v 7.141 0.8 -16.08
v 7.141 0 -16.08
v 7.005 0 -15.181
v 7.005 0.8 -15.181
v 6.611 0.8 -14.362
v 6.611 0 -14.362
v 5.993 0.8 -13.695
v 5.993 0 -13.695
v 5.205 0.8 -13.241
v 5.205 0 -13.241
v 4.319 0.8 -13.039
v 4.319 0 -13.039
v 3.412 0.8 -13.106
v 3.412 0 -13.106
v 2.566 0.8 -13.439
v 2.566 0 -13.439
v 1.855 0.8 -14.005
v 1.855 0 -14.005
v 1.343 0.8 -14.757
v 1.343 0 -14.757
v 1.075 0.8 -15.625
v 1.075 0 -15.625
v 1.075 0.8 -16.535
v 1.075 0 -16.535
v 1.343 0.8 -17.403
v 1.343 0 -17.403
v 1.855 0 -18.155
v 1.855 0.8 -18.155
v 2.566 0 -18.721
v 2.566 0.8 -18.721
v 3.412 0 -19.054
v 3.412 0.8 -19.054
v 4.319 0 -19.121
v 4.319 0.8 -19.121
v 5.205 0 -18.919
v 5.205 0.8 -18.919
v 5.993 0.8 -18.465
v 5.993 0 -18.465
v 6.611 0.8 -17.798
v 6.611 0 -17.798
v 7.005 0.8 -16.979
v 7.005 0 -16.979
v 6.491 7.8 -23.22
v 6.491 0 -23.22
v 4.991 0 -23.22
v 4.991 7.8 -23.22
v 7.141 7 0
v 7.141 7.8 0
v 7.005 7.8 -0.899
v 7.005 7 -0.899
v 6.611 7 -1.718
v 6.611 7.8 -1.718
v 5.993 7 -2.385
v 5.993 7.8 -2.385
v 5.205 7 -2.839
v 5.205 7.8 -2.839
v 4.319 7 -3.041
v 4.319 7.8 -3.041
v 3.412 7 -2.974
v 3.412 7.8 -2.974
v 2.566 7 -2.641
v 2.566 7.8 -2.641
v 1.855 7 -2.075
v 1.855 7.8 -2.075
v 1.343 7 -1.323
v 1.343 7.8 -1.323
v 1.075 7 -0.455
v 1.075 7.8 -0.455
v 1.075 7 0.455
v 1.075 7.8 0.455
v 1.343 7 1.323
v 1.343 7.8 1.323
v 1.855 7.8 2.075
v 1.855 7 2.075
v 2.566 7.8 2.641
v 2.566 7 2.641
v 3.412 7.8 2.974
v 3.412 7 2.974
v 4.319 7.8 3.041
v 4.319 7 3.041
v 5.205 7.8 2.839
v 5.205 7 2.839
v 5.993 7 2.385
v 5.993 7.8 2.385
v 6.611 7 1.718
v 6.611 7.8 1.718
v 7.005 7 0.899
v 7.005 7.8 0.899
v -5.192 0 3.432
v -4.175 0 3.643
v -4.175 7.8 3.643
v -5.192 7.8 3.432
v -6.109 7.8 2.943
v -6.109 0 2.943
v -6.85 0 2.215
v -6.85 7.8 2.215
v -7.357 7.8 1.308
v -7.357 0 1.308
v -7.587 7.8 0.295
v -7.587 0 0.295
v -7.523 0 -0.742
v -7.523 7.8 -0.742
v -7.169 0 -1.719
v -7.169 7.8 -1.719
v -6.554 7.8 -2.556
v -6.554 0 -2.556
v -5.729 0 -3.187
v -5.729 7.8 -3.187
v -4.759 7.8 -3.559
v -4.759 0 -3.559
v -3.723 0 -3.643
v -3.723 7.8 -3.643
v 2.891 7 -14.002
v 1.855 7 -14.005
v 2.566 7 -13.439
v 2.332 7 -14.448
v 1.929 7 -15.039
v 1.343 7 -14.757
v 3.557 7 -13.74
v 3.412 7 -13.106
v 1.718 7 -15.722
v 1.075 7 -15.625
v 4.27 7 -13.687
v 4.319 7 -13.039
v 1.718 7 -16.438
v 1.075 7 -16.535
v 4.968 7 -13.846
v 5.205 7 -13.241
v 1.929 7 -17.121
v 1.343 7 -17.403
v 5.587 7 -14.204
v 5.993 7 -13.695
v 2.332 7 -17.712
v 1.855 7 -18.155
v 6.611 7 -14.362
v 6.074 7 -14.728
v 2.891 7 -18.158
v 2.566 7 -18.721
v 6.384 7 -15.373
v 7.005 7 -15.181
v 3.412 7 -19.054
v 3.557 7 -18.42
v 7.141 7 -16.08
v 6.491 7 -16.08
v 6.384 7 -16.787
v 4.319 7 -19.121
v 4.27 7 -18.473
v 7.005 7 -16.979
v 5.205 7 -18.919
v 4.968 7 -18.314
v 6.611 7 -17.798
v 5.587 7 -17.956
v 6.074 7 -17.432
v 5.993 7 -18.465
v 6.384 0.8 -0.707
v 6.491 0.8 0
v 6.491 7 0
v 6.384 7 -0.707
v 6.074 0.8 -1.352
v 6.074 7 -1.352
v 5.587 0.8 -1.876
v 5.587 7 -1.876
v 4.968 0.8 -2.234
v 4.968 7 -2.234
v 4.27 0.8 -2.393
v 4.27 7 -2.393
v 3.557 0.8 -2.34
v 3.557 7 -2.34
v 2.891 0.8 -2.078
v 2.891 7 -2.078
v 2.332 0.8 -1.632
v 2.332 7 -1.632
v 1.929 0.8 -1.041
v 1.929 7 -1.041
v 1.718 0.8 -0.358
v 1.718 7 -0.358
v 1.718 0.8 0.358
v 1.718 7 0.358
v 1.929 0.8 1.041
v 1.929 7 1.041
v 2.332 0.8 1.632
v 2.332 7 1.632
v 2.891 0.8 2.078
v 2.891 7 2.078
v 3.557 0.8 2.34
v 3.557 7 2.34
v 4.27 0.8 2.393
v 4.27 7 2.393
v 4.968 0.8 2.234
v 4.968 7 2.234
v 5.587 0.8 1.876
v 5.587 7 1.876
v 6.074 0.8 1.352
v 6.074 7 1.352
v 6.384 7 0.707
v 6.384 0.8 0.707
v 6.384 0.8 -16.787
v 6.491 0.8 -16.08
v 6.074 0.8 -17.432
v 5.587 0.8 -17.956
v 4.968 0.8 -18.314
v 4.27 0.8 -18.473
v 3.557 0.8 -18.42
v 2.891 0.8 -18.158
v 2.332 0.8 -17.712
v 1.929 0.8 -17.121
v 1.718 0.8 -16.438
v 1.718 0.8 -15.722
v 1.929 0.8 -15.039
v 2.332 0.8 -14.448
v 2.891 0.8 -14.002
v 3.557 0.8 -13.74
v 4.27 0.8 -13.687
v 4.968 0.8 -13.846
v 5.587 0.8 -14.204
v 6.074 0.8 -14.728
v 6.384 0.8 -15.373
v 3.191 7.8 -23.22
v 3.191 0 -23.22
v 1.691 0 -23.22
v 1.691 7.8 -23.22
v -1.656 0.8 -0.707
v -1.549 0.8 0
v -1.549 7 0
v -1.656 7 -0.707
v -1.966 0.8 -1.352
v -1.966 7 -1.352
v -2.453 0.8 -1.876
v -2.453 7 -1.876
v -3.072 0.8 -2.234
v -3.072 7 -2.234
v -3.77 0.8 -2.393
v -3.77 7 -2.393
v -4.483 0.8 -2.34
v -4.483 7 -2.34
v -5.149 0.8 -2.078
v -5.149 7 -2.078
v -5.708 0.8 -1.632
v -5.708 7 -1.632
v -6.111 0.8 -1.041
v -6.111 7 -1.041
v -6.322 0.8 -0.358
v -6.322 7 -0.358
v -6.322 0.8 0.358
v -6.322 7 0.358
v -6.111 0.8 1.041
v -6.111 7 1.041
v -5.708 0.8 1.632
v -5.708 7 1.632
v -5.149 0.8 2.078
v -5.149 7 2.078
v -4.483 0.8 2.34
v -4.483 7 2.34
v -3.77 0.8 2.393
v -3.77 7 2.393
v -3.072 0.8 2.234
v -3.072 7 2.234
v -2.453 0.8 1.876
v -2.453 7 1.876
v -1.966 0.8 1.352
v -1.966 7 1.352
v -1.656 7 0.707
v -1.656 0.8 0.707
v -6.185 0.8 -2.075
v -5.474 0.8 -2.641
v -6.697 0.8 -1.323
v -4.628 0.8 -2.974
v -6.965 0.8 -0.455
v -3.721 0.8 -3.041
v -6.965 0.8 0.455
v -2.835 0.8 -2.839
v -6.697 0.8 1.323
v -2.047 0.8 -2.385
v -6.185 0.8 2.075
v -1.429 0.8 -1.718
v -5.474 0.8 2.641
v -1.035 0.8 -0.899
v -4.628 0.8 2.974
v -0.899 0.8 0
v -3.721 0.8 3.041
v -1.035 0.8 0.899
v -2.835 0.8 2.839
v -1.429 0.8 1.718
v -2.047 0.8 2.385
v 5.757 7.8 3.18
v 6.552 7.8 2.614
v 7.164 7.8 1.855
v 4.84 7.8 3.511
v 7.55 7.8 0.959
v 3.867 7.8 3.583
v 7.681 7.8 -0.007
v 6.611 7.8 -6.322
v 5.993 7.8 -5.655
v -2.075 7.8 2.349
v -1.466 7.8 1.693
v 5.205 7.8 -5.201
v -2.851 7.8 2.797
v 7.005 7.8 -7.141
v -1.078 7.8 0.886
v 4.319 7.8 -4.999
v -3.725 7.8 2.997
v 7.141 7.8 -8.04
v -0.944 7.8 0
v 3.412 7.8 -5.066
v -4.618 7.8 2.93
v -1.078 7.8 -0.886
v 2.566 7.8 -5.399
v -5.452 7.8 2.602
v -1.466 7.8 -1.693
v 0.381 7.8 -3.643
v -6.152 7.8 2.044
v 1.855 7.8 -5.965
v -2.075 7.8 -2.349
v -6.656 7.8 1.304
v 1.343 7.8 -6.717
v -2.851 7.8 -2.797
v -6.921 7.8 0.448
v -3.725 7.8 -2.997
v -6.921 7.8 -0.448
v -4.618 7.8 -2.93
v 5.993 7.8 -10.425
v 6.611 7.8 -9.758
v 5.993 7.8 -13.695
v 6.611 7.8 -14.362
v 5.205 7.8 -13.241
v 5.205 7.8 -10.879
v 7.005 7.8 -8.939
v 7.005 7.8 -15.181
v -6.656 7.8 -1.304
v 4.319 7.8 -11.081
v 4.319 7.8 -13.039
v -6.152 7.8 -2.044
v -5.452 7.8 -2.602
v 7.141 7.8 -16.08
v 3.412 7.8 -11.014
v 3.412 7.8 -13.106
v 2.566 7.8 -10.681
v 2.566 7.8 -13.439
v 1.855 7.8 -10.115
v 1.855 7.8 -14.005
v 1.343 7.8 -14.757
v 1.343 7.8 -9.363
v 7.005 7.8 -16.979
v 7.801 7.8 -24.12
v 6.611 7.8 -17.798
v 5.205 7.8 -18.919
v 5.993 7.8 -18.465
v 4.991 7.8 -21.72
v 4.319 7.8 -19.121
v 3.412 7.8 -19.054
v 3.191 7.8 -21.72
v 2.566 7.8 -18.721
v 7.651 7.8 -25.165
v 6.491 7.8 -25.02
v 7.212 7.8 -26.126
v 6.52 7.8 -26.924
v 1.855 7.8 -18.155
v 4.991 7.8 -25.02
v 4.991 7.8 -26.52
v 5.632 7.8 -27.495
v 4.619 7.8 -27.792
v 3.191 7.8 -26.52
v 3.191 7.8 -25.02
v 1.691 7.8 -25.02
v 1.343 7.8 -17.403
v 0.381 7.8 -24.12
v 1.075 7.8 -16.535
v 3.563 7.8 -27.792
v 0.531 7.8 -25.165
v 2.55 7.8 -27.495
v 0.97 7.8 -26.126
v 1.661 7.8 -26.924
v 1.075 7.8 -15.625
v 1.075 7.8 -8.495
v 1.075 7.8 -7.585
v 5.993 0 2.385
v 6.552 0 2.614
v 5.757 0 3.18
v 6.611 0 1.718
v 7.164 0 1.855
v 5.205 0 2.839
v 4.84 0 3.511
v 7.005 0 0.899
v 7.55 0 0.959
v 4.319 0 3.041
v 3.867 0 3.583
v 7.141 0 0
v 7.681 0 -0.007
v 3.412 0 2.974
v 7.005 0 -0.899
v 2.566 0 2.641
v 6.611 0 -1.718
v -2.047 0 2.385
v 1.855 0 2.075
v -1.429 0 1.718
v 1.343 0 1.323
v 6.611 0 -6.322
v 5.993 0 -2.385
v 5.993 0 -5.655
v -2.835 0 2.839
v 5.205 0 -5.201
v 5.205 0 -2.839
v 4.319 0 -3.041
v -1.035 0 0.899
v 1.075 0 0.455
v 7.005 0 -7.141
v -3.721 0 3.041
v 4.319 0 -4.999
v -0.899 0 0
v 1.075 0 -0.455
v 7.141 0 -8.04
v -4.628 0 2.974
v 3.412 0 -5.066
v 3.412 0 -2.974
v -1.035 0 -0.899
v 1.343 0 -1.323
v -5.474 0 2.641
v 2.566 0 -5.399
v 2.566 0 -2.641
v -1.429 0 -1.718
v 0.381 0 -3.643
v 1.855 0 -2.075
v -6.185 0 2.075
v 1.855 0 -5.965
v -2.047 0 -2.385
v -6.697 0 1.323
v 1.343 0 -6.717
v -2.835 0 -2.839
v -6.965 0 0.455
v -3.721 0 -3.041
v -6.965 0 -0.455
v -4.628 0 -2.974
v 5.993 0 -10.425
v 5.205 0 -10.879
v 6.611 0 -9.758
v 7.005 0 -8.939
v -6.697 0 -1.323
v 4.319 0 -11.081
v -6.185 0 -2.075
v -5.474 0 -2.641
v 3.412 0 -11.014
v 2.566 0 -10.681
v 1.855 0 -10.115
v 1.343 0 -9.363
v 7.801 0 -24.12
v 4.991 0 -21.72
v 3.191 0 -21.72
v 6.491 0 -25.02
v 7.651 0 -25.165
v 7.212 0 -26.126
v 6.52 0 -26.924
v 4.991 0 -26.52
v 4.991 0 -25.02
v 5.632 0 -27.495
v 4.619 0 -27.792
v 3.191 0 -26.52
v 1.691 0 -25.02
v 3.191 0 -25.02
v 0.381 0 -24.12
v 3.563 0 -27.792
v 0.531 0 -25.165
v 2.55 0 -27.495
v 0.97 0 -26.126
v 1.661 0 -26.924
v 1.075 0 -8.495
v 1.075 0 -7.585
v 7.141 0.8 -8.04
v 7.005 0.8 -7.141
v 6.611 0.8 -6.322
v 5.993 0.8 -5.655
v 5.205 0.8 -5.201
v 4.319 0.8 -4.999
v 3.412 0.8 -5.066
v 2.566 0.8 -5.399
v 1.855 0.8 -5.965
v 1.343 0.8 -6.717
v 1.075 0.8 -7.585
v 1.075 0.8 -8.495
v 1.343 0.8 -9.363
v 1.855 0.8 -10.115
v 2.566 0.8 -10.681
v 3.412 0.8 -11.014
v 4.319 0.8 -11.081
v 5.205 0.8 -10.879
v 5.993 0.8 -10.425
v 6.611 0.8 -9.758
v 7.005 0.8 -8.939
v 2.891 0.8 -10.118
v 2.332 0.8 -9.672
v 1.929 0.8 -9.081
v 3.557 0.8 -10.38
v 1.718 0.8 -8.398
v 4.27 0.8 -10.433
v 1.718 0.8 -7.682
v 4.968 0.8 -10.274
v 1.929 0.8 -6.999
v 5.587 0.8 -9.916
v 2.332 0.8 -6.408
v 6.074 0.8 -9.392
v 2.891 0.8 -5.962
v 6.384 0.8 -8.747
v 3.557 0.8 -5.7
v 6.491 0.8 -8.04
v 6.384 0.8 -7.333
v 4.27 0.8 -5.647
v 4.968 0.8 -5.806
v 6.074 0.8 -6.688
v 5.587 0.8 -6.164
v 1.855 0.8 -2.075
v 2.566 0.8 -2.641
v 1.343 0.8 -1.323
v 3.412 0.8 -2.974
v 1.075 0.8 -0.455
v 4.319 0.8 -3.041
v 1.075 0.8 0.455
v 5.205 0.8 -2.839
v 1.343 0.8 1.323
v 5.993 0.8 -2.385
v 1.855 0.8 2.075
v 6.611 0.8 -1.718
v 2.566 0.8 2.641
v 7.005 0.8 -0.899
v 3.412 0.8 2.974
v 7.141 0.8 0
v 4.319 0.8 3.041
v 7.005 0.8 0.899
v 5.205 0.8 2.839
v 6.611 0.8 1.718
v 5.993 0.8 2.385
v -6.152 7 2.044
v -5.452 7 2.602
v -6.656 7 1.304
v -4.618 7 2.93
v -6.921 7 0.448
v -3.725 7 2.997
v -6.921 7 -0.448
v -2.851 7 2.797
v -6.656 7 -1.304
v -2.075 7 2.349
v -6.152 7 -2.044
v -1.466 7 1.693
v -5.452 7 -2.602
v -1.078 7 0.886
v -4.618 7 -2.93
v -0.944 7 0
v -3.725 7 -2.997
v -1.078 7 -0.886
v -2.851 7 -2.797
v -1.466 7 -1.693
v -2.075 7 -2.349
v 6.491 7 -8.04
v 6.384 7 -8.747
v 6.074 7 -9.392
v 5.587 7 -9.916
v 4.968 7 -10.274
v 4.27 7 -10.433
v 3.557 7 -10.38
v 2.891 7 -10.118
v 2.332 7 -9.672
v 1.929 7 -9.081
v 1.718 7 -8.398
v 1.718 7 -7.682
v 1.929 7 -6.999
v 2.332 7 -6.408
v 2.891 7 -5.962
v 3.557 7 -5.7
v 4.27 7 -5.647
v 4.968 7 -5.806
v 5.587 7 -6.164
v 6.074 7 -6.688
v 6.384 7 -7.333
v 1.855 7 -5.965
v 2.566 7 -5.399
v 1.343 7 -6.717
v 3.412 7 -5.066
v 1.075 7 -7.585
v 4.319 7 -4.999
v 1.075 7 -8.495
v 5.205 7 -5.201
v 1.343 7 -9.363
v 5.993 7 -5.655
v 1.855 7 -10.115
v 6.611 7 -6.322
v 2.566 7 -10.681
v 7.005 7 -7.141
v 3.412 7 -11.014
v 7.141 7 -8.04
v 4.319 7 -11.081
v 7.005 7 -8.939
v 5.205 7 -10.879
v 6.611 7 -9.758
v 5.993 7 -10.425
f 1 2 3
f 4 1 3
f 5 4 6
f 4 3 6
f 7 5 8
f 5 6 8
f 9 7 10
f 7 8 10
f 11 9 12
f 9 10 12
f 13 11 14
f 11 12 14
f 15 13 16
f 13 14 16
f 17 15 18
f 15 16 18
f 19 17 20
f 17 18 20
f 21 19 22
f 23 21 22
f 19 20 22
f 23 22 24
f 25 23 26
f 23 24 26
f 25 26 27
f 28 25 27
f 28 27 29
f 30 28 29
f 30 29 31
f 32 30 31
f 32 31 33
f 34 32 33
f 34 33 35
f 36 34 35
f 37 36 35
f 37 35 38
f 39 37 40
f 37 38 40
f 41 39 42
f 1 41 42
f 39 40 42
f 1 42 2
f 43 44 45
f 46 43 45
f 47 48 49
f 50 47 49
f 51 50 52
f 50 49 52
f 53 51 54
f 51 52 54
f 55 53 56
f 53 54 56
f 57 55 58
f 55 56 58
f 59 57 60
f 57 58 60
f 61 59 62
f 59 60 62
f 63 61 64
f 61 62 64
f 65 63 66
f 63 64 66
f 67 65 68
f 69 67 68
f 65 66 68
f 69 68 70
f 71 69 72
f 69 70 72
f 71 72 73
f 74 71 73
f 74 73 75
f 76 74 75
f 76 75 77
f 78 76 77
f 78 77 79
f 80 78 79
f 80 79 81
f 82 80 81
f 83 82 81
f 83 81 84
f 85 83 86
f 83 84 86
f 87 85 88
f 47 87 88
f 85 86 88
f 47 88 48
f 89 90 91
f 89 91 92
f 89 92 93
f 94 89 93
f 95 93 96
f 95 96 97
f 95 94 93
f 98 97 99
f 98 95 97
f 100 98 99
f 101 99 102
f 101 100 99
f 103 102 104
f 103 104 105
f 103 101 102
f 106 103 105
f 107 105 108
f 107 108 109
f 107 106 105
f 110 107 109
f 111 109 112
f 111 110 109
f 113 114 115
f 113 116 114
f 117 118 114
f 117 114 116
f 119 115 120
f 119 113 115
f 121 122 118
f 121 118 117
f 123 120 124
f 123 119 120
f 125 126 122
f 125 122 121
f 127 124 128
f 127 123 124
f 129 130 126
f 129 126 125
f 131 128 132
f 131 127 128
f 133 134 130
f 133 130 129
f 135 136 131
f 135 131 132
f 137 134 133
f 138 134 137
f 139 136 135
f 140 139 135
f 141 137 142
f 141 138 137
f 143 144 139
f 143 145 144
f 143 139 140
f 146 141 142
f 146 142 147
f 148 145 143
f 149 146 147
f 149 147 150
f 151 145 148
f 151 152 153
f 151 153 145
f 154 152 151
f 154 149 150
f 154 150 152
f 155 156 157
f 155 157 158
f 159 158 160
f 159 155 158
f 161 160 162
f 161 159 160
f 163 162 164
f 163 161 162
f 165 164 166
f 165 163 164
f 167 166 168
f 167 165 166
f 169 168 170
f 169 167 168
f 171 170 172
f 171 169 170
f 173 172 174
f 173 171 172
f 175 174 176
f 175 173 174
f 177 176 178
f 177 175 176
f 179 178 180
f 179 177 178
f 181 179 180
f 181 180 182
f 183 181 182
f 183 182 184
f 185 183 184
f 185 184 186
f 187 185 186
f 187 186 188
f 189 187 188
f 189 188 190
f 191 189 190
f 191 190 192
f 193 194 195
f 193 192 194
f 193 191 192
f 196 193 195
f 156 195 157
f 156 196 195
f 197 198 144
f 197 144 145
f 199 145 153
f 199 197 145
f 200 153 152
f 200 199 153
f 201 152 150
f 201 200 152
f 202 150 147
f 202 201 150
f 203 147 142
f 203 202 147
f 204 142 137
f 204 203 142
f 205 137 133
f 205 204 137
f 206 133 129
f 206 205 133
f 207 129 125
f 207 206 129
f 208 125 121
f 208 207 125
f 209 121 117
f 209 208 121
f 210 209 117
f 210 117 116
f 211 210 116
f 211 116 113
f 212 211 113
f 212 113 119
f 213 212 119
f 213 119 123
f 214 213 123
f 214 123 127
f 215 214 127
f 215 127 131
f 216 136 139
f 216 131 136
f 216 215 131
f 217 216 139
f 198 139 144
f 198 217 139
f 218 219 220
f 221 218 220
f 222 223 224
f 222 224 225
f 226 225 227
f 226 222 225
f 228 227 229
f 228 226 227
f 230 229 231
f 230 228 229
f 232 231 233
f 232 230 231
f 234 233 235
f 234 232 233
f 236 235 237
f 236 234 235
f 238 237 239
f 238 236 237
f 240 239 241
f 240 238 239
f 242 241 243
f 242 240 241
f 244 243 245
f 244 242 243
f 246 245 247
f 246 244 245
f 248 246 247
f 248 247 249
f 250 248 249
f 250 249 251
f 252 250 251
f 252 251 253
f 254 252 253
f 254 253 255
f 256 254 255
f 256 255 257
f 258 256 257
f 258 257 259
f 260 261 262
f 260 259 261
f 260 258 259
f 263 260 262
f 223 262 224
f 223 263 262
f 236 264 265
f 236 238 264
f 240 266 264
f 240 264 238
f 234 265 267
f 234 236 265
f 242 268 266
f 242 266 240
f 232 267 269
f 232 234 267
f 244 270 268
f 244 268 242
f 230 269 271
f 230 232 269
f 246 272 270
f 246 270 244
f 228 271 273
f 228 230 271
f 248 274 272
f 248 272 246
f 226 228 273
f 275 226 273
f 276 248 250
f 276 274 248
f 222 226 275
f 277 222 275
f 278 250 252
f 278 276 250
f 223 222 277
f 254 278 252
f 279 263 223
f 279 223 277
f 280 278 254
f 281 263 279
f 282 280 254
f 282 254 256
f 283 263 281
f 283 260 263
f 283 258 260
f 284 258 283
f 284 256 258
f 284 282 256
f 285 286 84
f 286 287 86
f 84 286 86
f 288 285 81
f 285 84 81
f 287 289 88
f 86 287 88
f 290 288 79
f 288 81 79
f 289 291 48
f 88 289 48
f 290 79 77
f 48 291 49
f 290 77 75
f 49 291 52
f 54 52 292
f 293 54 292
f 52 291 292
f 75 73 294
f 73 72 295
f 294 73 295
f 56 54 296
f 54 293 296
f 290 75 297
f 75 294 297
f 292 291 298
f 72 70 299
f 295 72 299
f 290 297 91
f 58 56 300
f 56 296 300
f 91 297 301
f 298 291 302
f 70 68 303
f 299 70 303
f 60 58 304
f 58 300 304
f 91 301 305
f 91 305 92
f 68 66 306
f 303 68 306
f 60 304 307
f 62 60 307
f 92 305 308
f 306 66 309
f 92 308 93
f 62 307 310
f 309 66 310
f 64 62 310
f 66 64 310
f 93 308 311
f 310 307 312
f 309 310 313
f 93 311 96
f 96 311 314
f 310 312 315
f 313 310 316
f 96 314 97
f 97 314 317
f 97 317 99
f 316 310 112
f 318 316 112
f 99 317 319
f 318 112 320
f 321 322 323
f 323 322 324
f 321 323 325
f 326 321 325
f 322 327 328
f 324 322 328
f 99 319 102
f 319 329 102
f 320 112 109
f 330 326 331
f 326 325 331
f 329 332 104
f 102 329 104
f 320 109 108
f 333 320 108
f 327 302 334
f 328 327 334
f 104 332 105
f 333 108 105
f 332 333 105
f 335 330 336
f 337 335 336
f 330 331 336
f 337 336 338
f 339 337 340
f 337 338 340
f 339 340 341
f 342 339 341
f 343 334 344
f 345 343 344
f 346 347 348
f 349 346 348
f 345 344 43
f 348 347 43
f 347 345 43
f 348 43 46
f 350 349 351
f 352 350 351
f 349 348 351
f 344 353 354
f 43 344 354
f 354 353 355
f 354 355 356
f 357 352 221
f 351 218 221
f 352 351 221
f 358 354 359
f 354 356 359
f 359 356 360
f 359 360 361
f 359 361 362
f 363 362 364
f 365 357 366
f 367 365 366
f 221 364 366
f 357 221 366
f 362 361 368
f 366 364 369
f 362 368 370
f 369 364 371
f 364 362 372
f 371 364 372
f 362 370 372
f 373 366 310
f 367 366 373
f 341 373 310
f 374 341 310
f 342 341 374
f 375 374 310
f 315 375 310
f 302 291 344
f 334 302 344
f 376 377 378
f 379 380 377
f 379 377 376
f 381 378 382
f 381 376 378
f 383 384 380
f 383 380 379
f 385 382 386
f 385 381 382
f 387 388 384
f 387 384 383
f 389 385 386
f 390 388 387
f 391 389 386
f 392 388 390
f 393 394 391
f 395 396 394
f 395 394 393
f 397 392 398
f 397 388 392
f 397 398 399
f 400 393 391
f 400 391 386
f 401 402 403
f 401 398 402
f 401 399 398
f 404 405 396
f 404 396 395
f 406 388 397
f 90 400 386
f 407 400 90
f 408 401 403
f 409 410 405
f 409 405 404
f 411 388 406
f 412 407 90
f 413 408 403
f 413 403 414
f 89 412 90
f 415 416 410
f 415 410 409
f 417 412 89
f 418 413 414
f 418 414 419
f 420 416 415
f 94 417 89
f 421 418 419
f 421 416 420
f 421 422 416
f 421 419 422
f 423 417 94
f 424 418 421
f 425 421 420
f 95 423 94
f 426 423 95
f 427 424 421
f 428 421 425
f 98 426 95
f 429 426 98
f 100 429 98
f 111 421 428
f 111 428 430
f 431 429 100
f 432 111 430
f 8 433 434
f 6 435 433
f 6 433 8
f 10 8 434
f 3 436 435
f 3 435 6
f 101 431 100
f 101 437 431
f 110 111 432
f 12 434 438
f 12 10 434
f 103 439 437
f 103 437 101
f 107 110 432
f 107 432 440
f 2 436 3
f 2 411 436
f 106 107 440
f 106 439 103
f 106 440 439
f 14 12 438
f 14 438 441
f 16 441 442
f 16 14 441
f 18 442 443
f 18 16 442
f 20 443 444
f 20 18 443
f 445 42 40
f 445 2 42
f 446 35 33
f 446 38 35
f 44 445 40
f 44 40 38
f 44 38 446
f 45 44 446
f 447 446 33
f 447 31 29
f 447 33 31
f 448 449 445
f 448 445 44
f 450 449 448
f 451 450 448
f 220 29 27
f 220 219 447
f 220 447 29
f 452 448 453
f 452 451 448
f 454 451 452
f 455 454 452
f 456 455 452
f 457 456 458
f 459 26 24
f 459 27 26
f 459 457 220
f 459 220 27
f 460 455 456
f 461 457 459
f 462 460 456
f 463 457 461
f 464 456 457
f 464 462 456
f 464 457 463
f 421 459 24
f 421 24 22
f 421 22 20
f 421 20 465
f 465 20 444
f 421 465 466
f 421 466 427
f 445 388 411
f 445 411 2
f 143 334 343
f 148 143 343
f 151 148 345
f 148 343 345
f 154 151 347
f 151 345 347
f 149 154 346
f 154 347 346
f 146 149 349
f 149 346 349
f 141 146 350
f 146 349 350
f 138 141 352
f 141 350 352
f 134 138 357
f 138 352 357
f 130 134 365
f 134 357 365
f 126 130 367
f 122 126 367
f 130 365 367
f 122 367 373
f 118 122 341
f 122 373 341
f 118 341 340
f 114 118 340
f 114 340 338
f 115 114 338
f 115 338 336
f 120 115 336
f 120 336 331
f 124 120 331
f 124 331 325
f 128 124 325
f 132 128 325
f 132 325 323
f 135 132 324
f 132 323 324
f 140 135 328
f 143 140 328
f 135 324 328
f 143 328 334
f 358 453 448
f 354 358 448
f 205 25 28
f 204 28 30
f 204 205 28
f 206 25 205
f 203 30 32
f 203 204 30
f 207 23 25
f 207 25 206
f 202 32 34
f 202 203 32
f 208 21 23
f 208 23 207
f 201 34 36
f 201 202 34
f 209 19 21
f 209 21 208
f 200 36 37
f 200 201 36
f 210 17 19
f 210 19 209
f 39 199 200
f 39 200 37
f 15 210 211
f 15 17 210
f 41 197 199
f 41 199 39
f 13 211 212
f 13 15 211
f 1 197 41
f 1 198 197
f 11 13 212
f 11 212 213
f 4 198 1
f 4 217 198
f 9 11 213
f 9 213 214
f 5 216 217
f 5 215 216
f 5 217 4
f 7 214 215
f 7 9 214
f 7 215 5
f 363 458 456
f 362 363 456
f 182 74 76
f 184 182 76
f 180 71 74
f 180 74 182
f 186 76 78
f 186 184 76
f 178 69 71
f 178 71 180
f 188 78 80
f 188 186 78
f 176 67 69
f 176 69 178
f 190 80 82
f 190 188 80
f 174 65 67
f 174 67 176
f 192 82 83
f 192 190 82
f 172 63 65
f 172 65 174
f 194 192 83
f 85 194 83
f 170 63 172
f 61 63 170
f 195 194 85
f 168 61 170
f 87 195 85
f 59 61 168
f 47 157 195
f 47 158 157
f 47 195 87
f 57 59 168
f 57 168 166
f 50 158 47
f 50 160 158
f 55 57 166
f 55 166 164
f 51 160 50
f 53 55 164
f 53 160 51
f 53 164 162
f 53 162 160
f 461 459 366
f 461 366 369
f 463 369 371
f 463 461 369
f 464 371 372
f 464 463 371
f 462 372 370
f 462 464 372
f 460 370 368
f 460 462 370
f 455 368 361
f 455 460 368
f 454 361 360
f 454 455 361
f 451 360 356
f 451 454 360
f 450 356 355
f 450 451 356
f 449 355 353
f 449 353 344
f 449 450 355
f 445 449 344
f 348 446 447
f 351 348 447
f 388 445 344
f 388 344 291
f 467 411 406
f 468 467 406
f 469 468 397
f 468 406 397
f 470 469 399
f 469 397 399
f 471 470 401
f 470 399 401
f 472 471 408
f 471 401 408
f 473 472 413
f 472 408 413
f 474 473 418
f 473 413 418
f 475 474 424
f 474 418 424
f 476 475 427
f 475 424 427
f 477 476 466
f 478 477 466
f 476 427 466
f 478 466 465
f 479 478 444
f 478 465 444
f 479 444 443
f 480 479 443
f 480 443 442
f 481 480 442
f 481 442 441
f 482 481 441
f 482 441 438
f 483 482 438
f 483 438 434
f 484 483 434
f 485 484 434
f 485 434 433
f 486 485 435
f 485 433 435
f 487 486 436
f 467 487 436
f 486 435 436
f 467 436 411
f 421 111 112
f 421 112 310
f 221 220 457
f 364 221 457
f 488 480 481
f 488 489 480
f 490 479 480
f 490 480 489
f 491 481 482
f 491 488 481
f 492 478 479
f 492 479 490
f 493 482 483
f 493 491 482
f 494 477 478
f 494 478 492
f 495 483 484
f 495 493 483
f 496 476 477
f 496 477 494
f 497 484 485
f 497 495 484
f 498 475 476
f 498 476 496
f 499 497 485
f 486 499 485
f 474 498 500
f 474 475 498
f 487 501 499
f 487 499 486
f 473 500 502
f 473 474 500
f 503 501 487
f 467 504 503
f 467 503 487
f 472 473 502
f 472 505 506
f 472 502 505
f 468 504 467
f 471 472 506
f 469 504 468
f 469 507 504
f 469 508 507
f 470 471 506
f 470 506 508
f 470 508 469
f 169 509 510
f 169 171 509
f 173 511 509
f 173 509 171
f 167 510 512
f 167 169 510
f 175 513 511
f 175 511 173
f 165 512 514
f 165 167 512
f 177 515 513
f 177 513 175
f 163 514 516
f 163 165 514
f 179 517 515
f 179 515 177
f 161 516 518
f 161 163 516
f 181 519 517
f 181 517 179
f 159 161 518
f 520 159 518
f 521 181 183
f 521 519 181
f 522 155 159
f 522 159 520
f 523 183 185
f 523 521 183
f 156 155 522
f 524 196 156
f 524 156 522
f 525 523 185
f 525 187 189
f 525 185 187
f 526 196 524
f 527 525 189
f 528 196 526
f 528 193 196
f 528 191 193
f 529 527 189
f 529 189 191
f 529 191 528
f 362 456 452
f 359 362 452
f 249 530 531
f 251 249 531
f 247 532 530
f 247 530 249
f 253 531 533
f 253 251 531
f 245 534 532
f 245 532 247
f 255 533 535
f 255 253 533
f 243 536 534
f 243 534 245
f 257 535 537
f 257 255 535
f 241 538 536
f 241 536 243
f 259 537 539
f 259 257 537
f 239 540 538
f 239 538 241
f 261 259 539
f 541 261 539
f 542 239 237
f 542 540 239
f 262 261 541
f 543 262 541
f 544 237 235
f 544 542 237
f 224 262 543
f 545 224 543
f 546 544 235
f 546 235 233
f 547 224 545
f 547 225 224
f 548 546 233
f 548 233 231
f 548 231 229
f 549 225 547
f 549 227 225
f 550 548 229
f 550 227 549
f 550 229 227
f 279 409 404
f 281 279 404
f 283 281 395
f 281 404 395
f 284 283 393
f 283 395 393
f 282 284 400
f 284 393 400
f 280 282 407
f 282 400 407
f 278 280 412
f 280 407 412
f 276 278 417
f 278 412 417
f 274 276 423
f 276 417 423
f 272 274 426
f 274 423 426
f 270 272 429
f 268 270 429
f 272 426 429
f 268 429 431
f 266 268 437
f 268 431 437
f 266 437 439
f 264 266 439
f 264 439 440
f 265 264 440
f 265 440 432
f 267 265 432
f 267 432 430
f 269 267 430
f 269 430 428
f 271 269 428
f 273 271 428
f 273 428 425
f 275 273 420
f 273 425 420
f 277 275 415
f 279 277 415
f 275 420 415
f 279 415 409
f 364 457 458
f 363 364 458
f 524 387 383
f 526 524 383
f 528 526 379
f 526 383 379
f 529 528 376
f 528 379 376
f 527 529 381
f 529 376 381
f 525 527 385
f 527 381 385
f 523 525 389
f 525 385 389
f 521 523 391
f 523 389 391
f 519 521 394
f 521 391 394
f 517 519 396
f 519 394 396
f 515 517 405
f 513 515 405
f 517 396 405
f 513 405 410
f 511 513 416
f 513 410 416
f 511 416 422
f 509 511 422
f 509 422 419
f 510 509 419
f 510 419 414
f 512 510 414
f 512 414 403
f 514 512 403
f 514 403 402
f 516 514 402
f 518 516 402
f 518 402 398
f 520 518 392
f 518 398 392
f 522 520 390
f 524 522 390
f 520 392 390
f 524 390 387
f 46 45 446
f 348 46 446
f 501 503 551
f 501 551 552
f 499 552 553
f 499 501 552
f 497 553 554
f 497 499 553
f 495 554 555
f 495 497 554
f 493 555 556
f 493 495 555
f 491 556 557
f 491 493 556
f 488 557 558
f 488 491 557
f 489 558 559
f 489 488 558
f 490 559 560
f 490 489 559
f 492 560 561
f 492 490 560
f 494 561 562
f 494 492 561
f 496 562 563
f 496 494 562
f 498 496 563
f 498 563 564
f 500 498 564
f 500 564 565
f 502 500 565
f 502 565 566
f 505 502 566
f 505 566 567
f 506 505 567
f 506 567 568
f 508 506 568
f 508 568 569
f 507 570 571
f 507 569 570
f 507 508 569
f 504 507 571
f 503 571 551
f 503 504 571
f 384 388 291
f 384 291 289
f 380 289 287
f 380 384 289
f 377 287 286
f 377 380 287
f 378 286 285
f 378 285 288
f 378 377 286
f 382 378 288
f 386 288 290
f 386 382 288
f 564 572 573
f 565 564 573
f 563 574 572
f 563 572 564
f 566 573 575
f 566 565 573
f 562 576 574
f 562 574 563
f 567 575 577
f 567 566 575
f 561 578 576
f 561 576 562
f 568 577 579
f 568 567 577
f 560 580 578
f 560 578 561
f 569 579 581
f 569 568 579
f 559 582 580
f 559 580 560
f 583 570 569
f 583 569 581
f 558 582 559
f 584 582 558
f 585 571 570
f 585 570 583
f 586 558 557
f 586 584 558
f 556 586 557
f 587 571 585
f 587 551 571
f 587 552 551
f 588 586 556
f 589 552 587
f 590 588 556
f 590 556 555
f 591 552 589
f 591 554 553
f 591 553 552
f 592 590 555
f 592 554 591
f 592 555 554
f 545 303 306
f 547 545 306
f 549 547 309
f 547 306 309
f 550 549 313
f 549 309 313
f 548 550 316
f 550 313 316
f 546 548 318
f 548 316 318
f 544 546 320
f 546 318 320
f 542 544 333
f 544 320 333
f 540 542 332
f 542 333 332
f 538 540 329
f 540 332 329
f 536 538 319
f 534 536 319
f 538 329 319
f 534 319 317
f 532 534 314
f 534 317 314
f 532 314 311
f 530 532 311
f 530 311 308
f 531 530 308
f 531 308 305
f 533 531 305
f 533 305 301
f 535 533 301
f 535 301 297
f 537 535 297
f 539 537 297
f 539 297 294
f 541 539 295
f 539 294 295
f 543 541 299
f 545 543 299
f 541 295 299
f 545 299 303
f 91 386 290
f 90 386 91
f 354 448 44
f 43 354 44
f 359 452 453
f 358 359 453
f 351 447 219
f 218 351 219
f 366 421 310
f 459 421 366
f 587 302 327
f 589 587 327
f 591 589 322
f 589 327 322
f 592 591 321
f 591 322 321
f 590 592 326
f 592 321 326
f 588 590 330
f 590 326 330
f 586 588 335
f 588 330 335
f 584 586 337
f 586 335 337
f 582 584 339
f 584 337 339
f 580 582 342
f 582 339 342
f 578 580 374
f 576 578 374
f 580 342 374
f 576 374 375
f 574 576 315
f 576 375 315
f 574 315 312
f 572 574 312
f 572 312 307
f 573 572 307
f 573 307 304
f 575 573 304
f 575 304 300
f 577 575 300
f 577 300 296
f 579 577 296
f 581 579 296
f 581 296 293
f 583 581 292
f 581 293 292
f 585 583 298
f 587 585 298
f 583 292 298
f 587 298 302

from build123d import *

# Parameters (mm, degrees)
SKETCH1_R           = 2.4
BOSS_EXTRUDE2_DEPTH = 7.8
SKETCH2_R           = 3.005
SKETCH2_R_2         = 3.05
CUT_EXTRUDE1_DEPTH  = 0.8
SKETCH3_R           = 3.05
CUT_EXTRUDE2_DEPTH  = 0.8


with BuildPart() as part:
    # Sketch1 → Boss-Extrude2 (new body)
    with BuildSketch(Plane(origin=(0, 0, 0), x_dir=(1, 0, 0), z_dir=(0, 1, 0))):
        with BuildLine():
            Line((-3.723198341, 3.643010683), (0.380925068, 3.643010683))
            Line((0.380925068, 3.643010683), (0.380925068, 24.12))
            ThreePointArc((0.380925068, 24.12), (4.090929192, 27.830004128), (7.800933325, 24.120000008))
            Line((7.800933325, 24.120000008), (7.680923984, 0.007228348))
            ThreePointArc((7.680923984, 0.007228348), (6.551552066, -2.614086822), (3.866782865, -3.582997801))
            Line((3.866782865, -3.582997801), (-4.174942755, -3.643002442))
            ThreePointArc((-4.174942755, -3.643002442), (-7.592081486, 0.225872463), (-3.723198341, 3.643010683))
        make_face()
        with Locations((-3.949070804, 0)):
            Circle(SKETCH1_R, mode=Mode.SUBTRACT)
        with Locations((4.090929196, 0)):
            Circle(SKETCH1_R, mode=Mode.SUBTRACT)
        with Locations((4.090929196, 8.04)):
            Circle(SKETCH1_R, mode=Mode.SUBTRACT)
        with Locations((4.090929196, 16.08)):
            Circle(SKETCH1_R, mode=Mode.SUBTRACT)
        Polygon((3.190929196, 26.52), (4.990929196, 26.52), (4.990929196, 25.02), (6.490929196, 25.02), (6.490929196, 23.22), (4.990929196, 23.22), (4.990929196, 21.72), (3.190929196, 21.72), (3.190929196, 23.22), (1.690929196, 23.22), (1.690929196, 25.02), (3.190929196, 25.02), align=None, mode=Mode.SUBTRACT)
    extrude(amount=BOSS_EXTRUDE2_DEPTH)

    # Sketch2 → Cut-Extrude1 (cut)
    with BuildSketch(Plane(origin=(0, 7.8, 0), x_dir=(1, 0, 0), z_dir=(0, 1, 0))):
        with Locations((-3.949070804, 0)):
            Circle(SKETCH2_R)
        with Locations((4.090929196, 0)):
            Circle(SKETCH2_R_2)
        with Locations((4.090929196, 8.04)):
            Circle(SKETCH2_R_2)
        with Locations((4.090929196, 16.08)):
            Circle(SKETCH2_R_2)
    extrude(amount=-CUT_EXTRUDE1_DEPTH, mode=Mode.SUBTRACT)

    # Sketch3 → Cut-Extrude2 (cut)
    with BuildSketch(Plane.XZ):
        with Locations((-3.949070804, 0)):
            Circle(SKETCH3_R)
        with Locations((4.090929196, 0)):
            Circle(SKETCH3_R)
        with Locations((4.090929196, -8.04)):
            Circle(SKETCH3_R)
        with Locations((4.090929196, -16.08)):
            Circle(SKETCH3_R)
    extrude(amount=-CUT_EXTRUDE2_DEPTH, mode=Mode.SUBTRACT)


solid = part.part
